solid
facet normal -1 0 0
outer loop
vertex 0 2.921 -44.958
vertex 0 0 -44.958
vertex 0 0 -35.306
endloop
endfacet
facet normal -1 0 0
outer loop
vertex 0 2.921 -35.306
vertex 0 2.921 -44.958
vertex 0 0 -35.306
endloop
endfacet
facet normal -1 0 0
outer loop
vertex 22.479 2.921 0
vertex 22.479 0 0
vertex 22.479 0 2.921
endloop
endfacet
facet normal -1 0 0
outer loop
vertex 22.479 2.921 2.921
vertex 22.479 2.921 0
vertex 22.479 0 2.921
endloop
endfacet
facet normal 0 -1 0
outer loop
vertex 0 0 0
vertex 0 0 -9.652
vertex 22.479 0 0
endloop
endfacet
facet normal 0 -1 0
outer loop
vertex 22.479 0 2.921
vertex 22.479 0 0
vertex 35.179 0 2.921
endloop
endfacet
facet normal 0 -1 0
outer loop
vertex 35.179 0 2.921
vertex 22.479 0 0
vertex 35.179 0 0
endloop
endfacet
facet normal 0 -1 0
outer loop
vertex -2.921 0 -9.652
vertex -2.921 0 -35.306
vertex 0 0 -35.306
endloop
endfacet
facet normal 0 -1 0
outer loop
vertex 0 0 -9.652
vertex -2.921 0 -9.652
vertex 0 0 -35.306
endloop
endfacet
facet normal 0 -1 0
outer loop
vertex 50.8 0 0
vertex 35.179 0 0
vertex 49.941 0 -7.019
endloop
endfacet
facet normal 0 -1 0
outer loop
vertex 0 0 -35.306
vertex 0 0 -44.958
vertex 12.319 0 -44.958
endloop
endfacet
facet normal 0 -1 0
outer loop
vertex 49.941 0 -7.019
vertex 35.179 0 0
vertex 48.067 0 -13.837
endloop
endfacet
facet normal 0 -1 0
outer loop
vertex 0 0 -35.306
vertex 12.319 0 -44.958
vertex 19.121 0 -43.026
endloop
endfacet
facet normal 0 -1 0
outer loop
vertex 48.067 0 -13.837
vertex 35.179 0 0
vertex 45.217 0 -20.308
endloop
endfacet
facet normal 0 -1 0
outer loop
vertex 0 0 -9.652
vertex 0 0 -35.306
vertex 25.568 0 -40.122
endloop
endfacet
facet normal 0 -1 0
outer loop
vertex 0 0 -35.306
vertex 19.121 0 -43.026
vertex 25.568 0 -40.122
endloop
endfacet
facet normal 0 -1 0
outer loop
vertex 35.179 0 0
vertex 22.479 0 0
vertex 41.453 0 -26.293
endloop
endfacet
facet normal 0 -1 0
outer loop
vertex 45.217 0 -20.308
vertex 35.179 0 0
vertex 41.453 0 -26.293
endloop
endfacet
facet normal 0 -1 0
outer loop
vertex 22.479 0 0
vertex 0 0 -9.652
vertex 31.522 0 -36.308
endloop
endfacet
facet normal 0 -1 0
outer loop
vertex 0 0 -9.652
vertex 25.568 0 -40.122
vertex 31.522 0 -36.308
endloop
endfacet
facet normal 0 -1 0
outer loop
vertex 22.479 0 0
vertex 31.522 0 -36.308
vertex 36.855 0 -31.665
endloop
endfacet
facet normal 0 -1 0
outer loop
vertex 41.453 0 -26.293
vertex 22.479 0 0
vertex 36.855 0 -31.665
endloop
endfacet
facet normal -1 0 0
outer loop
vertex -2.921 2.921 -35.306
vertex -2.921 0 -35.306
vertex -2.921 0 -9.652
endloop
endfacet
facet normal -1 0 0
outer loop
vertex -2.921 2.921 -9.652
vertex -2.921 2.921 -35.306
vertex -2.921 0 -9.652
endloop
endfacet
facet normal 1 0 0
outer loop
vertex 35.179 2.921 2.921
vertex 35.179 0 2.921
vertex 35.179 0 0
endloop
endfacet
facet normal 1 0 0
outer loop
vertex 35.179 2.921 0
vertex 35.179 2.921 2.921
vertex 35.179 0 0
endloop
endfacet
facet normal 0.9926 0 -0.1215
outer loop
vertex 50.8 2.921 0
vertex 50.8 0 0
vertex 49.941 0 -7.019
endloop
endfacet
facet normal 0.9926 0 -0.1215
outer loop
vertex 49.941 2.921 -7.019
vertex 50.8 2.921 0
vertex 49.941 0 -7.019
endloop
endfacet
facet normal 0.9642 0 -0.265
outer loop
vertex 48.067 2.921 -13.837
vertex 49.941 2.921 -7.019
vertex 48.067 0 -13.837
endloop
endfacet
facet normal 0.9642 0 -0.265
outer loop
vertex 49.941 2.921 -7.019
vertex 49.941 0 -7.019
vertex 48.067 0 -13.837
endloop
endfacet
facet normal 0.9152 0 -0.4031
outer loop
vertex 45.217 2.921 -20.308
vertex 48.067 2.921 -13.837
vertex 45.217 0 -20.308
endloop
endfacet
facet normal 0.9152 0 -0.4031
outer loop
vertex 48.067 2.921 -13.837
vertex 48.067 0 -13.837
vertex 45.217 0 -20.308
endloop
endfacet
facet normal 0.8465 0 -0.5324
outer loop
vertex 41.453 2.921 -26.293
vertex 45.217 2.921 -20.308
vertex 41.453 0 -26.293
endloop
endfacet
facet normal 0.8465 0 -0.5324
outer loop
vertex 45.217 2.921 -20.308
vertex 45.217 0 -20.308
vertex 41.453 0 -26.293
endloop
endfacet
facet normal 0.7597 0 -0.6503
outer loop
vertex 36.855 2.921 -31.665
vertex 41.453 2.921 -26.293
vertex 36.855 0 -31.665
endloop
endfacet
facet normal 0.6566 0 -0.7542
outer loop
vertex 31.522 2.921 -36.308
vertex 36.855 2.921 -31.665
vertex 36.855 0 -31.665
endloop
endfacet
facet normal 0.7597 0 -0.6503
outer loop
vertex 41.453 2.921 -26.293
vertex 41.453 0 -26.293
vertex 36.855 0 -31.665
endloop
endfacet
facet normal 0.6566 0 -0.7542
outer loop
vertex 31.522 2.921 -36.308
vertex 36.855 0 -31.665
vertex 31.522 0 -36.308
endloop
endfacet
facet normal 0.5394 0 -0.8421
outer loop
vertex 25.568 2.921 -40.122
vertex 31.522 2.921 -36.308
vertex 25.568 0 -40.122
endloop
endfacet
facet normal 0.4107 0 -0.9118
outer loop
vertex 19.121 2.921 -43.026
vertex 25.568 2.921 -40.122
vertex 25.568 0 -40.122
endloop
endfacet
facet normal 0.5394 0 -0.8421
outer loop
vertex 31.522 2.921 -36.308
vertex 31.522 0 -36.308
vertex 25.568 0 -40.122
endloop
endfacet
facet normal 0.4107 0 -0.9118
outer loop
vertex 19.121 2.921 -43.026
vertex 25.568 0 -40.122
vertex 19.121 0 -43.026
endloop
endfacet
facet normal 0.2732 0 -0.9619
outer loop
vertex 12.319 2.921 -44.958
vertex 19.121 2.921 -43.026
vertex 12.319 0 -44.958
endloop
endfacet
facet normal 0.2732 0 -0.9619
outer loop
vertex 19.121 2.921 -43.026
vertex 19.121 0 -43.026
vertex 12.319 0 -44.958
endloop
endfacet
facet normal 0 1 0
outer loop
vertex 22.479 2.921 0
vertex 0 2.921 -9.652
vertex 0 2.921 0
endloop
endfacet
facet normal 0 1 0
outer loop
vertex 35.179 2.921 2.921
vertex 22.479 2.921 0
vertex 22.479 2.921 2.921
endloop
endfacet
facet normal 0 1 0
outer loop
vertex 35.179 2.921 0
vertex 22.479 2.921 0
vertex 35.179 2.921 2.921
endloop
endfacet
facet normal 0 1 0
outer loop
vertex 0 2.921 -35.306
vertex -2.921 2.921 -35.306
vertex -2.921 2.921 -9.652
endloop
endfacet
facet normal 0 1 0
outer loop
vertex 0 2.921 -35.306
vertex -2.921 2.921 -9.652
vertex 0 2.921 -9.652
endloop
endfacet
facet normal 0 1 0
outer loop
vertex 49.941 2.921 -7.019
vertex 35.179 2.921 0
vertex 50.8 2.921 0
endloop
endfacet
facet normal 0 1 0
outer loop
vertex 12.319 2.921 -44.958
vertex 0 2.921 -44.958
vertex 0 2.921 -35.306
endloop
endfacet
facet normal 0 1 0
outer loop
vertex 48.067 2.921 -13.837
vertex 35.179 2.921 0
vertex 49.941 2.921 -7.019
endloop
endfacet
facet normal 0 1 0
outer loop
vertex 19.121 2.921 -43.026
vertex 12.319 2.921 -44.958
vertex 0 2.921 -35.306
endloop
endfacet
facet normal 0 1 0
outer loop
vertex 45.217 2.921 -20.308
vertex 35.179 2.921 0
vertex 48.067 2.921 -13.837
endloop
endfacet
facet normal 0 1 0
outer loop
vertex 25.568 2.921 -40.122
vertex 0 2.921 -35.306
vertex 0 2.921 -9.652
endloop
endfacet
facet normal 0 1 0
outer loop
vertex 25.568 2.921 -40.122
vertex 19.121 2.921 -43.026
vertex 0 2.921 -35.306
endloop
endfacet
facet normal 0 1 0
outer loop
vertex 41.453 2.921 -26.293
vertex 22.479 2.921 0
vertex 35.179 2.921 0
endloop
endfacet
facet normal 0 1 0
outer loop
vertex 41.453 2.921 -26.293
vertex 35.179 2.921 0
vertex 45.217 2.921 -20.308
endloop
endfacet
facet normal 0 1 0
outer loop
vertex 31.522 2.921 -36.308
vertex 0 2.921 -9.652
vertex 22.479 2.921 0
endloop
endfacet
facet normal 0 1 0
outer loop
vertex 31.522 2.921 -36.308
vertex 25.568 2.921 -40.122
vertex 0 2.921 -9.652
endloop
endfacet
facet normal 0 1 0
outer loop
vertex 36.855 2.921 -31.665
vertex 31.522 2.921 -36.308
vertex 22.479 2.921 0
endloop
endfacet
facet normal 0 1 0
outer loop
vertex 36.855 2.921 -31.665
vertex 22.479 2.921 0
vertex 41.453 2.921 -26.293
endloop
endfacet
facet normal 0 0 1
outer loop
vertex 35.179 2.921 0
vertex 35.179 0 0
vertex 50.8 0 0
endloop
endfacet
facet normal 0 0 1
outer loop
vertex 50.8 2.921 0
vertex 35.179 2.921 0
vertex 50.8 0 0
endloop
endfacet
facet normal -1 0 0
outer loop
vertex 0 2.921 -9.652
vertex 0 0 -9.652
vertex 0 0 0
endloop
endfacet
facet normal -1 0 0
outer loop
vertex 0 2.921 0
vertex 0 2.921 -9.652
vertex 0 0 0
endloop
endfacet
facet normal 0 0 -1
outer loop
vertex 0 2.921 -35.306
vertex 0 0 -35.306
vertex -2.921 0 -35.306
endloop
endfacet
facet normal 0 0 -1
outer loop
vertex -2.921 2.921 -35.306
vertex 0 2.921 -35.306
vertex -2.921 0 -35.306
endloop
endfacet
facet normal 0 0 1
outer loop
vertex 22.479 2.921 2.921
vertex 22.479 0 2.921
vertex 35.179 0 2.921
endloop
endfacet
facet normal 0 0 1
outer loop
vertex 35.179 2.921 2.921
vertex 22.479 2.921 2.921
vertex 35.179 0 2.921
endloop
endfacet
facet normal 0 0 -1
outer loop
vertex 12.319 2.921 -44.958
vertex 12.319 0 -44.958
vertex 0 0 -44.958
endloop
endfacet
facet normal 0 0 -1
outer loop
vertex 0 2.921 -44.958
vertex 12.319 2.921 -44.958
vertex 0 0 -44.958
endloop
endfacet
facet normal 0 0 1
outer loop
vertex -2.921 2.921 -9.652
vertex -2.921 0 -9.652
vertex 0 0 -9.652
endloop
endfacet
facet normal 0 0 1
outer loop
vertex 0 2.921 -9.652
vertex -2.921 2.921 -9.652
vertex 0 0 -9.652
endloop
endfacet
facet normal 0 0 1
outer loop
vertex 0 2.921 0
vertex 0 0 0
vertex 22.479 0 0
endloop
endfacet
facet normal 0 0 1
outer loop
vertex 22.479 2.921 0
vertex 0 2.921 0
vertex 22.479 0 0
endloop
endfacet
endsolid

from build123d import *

# Parameters (mm, degrees)
BOSS_EXTRUDE1_DEPTH = 2.921


with BuildPart() as part:
    # Sketch2 → Boss-Extrude1 (new body)
    with BuildSketch(Plane(origin=(0, 0, 0), x_dir=(1, 0, 0), z_dir=(0, 1, 0))):
        with BuildLine():
            Line((35.179, 0), (50.8, 0))
            ThreePointArc((50.8, 0), (39.252334483, 29.06354477), (12.319, 44.958))
            Line((12.319, 44.958), (0, 44.958))
            Line((0, 44.958), (0, 35.306))
            Line((0, 35.306), (-2.921, 35.306))
            Line((-2.921, 35.306), (-2.921, 9.652))
            Line((-2.921, 9.652), (0, 9.652))
            Line((0, 9.652), (0, 0))
            Line((0, 0), (22.479, 0))
            Line((22.479, 0), (22.479, -2.921))
            Line((22.479, -2.921), (35.179, -2.921))
            Line((35.179, -2.921), (35.179, 0))
        make_face()
    extrude(amount=BOSS_EXTRUDE1_DEPTH)


solid = part.part
